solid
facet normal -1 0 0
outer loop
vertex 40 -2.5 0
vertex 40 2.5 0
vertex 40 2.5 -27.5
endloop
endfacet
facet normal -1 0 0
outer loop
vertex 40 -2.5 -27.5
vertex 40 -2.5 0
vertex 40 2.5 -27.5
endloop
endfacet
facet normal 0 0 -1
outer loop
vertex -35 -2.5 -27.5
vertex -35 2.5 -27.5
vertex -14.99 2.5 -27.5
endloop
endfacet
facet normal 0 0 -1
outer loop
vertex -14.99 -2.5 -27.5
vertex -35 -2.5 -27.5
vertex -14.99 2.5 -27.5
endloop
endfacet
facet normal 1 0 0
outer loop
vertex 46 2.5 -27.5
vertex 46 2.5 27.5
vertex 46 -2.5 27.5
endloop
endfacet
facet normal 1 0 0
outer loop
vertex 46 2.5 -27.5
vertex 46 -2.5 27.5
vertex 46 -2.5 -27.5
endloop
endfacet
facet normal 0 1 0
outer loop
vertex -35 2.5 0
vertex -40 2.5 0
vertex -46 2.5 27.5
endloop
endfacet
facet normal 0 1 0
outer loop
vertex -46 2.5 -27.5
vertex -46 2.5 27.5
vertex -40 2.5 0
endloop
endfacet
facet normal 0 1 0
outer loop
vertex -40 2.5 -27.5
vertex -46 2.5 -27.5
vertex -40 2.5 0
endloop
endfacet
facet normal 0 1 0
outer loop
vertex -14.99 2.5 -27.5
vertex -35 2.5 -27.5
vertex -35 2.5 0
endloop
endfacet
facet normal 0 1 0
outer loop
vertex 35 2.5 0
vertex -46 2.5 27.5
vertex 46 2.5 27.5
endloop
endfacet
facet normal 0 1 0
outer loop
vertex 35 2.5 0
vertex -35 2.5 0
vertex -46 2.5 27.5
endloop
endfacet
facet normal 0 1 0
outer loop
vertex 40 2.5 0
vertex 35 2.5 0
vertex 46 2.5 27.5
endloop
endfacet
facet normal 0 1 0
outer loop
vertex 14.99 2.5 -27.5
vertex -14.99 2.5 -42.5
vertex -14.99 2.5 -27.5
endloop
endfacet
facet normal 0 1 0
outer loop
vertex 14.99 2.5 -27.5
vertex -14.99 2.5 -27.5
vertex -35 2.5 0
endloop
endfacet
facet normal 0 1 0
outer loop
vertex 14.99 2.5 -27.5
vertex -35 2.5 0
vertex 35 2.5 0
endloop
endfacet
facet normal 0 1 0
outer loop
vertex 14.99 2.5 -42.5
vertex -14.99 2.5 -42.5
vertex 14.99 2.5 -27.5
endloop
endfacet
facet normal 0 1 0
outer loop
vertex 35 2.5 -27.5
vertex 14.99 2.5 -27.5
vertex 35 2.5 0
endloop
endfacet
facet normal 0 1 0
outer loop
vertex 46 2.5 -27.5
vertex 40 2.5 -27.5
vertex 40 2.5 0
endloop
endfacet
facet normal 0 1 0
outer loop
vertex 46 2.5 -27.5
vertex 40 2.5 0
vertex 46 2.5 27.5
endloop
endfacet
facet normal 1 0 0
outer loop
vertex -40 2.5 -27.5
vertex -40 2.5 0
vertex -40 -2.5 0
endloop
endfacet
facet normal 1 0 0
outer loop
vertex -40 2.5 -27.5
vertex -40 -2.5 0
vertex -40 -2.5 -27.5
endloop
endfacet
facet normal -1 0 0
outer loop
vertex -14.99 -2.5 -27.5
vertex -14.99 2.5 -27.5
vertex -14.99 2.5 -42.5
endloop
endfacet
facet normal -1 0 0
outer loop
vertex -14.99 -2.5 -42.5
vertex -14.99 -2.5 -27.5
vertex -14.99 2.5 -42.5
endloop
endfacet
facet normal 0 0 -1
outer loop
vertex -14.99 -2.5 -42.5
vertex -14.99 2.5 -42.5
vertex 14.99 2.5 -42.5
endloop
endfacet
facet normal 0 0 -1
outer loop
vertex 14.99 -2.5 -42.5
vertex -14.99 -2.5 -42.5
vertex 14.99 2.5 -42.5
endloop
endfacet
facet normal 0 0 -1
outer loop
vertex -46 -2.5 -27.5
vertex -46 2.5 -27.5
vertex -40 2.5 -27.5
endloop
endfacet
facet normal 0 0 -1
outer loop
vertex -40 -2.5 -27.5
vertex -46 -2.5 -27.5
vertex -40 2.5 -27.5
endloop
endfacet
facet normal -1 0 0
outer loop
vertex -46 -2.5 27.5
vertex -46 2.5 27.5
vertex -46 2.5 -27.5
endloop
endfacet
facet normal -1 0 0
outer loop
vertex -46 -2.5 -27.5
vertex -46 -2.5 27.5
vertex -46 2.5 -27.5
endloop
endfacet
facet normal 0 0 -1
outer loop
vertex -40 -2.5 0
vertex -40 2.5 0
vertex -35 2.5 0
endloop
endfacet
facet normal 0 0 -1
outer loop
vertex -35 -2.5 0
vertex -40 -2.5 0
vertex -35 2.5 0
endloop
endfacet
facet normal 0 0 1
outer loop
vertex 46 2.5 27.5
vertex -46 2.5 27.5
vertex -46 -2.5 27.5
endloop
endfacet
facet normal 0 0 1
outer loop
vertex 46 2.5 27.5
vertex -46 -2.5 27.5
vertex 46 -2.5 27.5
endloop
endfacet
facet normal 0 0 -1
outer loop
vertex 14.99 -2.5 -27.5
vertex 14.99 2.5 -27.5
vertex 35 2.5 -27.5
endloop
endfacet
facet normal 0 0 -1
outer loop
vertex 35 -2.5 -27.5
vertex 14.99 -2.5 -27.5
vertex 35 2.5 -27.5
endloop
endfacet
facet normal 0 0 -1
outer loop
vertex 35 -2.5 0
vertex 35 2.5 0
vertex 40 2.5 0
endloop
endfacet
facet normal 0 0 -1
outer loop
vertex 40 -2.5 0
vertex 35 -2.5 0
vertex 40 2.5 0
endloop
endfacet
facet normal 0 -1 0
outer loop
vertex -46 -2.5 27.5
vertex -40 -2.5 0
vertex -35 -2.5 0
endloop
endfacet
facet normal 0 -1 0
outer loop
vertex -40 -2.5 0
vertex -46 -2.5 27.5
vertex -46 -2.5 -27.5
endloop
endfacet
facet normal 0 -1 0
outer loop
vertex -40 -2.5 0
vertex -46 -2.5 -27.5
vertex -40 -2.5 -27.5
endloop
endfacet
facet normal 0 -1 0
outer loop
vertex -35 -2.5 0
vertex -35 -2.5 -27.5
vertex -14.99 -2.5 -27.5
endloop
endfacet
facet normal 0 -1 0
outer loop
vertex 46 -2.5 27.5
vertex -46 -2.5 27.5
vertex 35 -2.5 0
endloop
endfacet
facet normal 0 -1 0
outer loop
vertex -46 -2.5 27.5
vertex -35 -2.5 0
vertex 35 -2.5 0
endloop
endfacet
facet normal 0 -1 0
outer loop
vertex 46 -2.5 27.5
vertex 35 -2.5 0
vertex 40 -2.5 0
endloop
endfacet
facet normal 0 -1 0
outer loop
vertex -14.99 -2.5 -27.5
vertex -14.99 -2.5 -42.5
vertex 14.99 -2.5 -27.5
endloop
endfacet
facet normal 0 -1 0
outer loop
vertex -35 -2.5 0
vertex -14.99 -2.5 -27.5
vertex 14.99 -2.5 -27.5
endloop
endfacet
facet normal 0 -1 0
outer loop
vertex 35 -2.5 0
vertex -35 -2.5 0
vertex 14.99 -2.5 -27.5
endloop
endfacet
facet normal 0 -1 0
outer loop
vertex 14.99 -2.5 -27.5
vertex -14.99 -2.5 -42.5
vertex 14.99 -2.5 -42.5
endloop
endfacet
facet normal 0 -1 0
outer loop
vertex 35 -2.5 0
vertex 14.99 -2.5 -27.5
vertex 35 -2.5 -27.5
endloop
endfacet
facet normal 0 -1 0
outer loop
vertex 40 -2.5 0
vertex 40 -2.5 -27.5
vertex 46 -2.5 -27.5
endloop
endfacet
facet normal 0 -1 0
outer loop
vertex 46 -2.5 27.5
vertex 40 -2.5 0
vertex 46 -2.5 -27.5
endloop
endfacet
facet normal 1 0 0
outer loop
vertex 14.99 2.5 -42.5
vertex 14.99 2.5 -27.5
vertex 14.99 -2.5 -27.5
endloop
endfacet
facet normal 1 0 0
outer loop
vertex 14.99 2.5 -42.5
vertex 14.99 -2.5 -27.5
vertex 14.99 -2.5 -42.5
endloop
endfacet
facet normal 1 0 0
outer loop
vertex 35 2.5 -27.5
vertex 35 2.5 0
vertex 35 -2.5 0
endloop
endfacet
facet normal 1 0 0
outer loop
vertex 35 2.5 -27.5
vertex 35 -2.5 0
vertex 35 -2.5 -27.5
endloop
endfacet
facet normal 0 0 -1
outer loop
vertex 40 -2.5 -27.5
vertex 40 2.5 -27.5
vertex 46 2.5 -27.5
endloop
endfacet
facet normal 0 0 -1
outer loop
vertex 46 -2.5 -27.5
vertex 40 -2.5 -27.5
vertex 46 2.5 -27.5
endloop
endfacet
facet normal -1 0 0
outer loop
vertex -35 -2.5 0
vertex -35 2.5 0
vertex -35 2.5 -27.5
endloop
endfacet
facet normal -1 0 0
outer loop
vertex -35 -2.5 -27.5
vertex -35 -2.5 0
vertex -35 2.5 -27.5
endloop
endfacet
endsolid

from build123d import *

# Parameters (mm, degrees)
SKETCH1_W           = 92
SKETCH1_H           = 55
BOSS_EXTRUDE1_DEPTH = 2.5
SKETCH2_W           = 5
SKETCH2_H           = 27.5
CUT_EXTRUDE1_DEPTH  = 6
SKETCH3_W           = 29.98
SKETCH3_H           = 15
BOSS_EXTRUDE2_DEPTH = 5


with BuildPart() as part:
    # Sketch1 → Boss-Extrude1 (new body, symmetric)
    with BuildSketch(Plane(origin=(0, 0, 0), x_dir=(1, 0, 0), z_dir=(0, 1, 0))):
        Rectangle(SKETCH1_W, SKETCH1_H)
    extrude(amount=BOSS_EXTRUDE1_DEPTH, both=True)

    # Sketch2 → Cut-Extrude1 (cut, through all)
    with BuildSketch(Plane(origin=(0, 2.5, 0), x_dir=(1, 0, 0), z_dir=(0, 1, 0))):
        with Locations((-37.5, 13.75)):
            Rectangle(SKETCH2_W, SKETCH2_H)
        with Locations((37.5, 13.75)):
            Rectangle(SKETCH2_W, SKETCH2_H)
    extrude(amount=-CUT_EXTRUDE1_DEPTH, mode=Mode.SUBTRACT)

    # Sketch3 → Boss-Extrude2 (add)
    with BuildSketch(Plane(origin=(0, 2.5, 0), x_dir=(1, 0, 0), z_dir=(0, 1, 0))):
        with Locations((0, 35)):
            Rectangle(SKETCH3_W, SKETCH3_H)
    extrude(amount=-BOSS_EXTRUDE2_DEPTH)


solid = part.part
